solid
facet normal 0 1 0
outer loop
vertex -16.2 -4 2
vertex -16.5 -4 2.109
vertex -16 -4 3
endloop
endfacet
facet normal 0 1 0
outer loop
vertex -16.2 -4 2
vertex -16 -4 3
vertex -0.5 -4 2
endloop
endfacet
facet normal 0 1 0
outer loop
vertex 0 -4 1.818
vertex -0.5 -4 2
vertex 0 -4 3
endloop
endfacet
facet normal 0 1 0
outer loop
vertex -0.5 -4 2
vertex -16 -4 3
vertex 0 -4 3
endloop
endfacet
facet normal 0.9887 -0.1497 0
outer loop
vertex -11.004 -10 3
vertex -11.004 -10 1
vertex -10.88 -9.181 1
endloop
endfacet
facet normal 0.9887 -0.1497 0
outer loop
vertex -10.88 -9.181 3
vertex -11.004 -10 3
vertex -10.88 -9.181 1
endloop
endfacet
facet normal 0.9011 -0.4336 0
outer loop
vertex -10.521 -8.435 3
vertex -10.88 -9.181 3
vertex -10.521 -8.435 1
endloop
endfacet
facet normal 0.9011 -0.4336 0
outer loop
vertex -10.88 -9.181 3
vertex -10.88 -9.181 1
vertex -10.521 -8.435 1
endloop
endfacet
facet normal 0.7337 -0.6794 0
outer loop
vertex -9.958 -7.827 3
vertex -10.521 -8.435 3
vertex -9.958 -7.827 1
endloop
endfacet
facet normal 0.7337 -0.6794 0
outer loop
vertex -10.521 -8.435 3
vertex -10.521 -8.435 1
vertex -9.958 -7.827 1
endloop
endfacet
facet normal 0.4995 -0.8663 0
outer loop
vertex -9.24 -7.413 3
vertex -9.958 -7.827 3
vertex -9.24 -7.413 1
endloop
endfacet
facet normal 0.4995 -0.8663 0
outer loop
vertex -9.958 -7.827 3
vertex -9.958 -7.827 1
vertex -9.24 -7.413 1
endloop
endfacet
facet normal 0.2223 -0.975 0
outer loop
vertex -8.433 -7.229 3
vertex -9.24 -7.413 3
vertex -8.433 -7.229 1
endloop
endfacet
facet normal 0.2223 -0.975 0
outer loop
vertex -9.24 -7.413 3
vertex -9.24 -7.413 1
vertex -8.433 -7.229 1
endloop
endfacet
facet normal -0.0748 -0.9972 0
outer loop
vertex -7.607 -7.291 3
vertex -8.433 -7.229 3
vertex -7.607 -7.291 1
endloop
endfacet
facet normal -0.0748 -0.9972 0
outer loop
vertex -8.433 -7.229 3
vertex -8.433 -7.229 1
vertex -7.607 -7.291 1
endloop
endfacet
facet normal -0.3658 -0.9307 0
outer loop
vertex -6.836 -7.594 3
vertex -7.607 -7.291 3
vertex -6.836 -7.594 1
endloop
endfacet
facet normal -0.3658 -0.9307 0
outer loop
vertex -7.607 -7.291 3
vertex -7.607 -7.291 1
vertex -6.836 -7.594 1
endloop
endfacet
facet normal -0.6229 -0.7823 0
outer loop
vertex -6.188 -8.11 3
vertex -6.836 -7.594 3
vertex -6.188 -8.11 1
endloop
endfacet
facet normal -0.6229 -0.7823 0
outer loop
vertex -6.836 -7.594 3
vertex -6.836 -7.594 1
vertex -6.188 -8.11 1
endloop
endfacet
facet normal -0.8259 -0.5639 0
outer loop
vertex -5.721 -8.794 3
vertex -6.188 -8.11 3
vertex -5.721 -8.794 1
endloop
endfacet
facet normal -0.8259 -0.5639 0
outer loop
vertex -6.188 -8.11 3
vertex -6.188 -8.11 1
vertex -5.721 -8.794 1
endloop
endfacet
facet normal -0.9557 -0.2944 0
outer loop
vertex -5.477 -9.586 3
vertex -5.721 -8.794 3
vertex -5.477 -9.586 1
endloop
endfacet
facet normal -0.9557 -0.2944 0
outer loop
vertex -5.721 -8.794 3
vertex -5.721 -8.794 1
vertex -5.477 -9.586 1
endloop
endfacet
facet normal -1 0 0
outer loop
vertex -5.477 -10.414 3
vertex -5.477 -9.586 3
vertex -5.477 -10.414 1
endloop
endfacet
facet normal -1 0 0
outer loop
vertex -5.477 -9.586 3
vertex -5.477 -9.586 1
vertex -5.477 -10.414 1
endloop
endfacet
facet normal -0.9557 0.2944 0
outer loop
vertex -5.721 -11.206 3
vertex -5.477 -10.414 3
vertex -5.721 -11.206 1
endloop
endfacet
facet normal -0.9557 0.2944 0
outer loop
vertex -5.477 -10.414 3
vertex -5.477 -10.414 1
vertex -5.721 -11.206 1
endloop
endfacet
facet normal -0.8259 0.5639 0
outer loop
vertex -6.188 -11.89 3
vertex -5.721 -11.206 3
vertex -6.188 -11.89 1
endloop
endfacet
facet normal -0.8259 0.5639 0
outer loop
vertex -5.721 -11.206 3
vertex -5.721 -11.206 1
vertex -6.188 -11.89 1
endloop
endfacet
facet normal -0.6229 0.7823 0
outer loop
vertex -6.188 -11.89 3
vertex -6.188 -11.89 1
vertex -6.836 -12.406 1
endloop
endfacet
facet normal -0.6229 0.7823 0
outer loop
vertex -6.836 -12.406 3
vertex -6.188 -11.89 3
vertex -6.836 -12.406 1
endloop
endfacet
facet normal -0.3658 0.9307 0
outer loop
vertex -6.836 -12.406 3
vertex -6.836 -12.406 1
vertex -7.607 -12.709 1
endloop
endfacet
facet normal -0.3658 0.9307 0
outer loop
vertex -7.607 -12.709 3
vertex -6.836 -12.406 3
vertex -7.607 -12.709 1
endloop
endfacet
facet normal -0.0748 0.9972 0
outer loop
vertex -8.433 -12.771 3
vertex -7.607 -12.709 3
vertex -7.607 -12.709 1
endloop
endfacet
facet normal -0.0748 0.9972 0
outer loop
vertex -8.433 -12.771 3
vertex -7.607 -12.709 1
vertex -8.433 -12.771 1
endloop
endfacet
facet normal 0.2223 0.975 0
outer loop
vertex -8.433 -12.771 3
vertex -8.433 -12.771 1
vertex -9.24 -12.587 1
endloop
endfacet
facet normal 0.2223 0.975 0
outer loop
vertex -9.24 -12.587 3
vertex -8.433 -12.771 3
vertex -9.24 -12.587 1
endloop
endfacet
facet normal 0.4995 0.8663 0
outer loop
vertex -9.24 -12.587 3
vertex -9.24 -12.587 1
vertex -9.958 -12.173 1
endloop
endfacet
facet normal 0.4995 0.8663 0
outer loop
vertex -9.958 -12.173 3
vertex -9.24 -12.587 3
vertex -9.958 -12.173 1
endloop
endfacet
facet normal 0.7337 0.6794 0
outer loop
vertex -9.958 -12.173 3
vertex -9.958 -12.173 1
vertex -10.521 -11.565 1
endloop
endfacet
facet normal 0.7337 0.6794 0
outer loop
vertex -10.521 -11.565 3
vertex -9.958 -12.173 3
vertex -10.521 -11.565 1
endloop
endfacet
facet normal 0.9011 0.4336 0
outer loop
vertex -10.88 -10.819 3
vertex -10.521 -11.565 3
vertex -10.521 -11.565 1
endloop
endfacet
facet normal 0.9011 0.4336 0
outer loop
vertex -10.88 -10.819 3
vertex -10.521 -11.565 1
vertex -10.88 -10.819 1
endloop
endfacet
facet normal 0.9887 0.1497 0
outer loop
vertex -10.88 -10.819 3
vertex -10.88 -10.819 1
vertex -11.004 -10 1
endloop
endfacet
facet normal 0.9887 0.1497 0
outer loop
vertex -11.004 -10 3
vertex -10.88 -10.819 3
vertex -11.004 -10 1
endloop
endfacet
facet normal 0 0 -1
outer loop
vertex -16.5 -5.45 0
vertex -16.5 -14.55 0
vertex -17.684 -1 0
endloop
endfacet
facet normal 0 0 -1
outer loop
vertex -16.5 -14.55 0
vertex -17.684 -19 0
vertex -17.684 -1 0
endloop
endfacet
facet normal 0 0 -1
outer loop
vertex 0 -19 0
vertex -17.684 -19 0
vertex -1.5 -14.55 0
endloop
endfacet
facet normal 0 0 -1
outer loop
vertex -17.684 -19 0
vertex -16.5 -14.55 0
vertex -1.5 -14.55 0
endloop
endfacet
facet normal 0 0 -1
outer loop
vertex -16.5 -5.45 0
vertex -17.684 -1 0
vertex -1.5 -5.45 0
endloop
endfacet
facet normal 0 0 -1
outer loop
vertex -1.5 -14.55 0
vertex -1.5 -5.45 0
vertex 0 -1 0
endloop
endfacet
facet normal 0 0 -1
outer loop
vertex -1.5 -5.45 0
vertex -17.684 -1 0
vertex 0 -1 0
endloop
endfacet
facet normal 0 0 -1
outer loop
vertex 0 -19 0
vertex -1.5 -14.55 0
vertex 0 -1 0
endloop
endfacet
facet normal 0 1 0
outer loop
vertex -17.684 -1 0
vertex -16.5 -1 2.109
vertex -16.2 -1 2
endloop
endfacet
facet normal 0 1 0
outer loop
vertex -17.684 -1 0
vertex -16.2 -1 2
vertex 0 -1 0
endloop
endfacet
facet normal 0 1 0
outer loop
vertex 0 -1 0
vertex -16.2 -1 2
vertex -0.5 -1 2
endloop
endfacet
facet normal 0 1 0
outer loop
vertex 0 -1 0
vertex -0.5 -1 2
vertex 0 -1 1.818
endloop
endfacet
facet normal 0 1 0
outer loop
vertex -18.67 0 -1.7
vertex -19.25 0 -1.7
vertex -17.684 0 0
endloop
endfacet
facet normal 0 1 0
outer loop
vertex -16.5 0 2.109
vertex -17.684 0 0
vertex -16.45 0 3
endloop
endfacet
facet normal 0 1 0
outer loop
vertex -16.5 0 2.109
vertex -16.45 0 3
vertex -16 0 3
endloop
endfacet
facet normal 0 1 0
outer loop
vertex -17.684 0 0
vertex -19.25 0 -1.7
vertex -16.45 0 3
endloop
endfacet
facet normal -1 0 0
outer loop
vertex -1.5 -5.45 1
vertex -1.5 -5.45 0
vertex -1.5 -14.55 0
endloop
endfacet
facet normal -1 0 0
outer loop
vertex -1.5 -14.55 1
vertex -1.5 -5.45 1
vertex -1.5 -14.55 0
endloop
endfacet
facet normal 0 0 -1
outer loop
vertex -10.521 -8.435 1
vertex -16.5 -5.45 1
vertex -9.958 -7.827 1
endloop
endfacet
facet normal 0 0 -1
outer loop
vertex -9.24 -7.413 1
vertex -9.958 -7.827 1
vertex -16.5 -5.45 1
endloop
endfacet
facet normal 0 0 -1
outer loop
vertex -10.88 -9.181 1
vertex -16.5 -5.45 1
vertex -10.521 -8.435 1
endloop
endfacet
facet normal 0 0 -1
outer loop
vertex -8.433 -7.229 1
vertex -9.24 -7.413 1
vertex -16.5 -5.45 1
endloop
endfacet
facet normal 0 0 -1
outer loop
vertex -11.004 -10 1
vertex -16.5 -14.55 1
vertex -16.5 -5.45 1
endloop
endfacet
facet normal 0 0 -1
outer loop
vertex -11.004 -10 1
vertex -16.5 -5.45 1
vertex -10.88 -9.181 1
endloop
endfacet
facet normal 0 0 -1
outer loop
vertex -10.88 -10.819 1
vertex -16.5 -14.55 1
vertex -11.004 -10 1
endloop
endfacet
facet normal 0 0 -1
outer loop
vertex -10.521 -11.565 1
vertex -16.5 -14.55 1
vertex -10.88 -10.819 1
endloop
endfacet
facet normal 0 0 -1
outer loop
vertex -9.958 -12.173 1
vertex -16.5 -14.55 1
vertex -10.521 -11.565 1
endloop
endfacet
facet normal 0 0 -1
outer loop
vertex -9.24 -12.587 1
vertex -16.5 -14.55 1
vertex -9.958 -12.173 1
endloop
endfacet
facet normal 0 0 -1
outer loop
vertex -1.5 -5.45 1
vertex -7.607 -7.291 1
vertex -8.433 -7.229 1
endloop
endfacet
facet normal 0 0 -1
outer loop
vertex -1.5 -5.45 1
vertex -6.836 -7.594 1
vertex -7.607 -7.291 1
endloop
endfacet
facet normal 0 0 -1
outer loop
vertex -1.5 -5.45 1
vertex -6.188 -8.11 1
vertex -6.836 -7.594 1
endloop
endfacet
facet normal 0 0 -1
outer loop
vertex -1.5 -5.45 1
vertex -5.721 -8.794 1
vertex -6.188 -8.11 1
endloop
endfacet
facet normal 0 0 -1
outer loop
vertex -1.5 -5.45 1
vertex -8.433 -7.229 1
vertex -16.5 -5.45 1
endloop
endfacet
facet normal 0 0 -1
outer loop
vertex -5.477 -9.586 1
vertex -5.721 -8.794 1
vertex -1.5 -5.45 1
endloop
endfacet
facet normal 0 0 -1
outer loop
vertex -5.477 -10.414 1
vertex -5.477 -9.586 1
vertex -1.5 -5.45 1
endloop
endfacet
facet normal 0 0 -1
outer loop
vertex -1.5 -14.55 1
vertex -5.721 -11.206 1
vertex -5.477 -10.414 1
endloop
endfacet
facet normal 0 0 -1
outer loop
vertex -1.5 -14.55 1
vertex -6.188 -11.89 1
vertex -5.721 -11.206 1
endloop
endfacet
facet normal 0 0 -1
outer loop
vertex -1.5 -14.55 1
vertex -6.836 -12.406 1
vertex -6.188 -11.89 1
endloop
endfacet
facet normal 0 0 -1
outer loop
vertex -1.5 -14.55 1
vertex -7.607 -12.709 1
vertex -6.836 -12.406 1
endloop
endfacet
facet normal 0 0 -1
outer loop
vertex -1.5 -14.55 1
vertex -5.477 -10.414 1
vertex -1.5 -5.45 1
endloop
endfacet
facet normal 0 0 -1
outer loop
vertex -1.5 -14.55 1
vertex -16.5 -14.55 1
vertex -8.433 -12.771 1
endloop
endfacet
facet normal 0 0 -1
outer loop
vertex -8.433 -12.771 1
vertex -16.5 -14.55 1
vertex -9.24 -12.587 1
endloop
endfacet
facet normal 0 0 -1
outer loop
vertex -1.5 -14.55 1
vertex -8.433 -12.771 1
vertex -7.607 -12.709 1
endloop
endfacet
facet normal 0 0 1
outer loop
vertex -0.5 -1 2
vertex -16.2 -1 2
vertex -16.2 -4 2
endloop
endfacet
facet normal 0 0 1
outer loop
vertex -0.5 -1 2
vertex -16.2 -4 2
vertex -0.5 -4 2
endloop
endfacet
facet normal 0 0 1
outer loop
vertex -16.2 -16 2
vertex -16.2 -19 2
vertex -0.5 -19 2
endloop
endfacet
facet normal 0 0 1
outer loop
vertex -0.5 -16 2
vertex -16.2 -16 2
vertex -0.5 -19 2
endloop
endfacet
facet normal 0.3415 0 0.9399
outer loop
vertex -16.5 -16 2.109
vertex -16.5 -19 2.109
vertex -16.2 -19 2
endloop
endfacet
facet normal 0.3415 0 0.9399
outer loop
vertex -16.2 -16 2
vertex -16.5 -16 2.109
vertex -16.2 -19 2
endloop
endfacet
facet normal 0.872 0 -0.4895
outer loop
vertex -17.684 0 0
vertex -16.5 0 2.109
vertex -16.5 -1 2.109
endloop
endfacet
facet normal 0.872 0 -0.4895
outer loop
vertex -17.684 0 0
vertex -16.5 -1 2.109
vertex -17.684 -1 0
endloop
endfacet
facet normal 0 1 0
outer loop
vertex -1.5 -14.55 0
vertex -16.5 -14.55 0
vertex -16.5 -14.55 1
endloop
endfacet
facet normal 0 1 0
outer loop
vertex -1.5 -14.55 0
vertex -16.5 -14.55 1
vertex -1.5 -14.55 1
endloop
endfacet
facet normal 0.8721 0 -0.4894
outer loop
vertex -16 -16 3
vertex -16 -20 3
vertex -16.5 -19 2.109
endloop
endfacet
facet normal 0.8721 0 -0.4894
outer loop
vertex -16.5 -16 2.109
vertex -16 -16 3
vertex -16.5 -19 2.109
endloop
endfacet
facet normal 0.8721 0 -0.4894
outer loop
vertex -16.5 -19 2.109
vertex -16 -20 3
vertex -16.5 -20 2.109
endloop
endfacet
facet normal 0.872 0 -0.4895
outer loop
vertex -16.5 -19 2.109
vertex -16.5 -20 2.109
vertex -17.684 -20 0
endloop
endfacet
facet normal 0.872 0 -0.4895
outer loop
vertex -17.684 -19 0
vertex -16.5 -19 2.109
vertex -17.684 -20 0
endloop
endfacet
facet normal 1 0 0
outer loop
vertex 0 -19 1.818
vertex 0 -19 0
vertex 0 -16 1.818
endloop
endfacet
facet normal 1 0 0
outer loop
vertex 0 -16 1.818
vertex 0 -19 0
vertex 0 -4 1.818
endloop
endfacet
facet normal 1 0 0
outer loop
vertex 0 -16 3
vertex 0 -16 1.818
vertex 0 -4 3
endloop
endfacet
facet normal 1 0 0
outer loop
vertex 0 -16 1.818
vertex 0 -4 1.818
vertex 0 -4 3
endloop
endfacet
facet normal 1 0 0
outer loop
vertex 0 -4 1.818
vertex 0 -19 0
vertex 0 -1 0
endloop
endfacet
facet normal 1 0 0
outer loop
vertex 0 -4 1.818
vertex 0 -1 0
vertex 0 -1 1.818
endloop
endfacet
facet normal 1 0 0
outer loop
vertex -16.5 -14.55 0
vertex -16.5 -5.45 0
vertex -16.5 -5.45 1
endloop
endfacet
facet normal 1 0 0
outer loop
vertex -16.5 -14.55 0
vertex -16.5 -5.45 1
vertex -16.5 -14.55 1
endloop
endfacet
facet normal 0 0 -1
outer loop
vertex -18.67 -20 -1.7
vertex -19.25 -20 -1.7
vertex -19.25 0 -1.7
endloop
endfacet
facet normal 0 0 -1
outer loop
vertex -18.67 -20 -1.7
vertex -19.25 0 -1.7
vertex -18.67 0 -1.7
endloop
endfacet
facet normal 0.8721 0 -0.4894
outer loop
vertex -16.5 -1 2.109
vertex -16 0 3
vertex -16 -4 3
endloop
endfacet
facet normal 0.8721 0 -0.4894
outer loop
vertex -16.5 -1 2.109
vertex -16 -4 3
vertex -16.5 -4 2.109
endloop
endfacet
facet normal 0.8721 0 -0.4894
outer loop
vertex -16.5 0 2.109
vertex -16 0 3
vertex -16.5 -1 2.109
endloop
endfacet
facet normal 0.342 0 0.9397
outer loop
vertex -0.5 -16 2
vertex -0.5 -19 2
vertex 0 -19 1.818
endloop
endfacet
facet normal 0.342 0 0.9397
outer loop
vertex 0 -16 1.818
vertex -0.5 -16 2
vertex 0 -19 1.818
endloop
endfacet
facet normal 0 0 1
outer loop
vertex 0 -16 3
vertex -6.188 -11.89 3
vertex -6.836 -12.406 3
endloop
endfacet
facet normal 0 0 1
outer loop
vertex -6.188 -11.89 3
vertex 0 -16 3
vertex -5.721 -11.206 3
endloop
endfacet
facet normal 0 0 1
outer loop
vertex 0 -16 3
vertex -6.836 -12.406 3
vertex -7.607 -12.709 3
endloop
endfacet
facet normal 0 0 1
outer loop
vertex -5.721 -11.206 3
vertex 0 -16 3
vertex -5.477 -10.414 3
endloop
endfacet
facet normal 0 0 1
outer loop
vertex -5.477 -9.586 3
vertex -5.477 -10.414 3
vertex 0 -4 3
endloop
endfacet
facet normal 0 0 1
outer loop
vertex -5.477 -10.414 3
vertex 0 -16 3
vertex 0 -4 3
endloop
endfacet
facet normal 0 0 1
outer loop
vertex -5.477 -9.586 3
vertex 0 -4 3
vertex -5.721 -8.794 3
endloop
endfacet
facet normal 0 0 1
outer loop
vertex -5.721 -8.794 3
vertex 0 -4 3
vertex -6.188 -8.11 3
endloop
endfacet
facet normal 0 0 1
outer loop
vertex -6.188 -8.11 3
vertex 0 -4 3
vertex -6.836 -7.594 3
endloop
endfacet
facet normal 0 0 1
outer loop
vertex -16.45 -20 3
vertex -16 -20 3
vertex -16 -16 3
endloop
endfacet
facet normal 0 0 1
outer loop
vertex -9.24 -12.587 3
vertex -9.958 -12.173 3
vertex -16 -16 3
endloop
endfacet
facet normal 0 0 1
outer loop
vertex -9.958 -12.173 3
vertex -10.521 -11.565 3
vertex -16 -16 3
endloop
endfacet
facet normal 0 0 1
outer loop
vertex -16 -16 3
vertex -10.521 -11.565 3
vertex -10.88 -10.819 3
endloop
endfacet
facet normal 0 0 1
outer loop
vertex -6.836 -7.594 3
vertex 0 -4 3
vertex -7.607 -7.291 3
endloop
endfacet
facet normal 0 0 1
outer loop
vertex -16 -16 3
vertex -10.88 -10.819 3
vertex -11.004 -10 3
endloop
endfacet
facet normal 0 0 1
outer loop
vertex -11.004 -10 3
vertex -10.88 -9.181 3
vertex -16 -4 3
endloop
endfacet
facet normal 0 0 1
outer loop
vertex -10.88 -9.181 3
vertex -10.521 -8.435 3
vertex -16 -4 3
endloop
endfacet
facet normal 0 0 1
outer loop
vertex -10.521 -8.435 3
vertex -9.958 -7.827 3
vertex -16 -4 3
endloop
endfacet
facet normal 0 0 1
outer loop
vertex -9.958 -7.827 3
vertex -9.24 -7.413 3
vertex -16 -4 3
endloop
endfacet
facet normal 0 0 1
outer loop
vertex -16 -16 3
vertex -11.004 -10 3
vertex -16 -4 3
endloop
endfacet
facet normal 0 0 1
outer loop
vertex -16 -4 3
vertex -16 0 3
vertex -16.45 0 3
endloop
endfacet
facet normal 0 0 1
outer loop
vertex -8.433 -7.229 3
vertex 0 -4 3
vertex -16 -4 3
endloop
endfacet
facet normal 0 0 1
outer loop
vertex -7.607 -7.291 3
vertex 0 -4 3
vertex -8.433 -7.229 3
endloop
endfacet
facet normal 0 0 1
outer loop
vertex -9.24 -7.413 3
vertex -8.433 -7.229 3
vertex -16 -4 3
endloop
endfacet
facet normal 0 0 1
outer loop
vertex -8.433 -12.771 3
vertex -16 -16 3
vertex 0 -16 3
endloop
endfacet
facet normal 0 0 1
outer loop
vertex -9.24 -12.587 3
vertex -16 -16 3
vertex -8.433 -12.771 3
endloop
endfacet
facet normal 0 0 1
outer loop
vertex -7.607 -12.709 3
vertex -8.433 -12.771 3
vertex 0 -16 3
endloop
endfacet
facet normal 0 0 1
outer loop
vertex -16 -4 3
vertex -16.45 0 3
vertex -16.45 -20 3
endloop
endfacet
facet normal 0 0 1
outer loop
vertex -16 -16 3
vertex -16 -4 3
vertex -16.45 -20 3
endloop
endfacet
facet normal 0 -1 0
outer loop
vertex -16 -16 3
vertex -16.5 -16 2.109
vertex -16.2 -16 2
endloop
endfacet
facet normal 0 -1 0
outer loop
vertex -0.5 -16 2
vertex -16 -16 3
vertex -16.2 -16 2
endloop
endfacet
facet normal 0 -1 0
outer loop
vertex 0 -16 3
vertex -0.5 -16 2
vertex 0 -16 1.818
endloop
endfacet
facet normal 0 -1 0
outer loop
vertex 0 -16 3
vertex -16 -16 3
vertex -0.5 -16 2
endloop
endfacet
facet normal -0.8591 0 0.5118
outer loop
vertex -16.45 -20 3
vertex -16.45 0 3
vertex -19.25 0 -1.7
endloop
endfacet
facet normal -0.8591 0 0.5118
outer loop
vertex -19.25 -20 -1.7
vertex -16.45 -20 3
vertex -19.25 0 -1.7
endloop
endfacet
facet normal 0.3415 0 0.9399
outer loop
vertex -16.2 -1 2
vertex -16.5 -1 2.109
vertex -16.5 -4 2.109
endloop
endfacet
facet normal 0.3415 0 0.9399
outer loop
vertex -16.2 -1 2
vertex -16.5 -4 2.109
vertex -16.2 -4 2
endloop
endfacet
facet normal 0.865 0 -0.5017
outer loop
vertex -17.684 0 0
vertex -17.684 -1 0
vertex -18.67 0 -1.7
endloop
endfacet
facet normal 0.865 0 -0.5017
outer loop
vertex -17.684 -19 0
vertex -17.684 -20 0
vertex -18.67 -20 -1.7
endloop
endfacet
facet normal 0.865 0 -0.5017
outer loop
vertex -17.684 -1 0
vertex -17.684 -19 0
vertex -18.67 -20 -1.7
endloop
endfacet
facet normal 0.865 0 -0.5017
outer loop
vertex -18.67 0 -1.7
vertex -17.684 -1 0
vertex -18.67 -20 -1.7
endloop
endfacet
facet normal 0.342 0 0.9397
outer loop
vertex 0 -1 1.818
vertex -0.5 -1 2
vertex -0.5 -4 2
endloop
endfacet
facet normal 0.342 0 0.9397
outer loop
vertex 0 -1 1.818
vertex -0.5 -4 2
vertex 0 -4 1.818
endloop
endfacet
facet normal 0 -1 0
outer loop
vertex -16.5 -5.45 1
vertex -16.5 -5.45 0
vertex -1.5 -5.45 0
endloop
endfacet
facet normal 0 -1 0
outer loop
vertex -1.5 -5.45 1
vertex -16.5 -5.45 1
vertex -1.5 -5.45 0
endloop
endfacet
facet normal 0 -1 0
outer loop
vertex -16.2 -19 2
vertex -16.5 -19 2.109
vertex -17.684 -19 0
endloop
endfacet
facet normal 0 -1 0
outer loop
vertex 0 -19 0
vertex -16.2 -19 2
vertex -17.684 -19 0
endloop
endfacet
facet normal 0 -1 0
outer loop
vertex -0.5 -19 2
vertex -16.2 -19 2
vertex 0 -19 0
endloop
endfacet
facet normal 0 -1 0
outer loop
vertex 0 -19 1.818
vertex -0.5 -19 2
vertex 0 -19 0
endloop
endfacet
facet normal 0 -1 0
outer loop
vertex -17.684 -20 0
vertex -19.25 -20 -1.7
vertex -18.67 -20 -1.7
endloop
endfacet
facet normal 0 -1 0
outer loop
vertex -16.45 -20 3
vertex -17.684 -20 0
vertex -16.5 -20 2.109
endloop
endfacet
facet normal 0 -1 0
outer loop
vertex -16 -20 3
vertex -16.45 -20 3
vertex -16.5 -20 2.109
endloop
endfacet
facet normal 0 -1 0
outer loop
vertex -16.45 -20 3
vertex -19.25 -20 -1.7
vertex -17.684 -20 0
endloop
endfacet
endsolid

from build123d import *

# Parameters (mm, degrees)
F1_DEPTH  = 20
F3_DEPTH  = 4
F5_DEPTH  = 1
F7_DEPTH  = 20.001
F10_W     = 15
F10_H     = 9.1
F11_DEPTH = 1
F12_D     = 5.55752


# Not quite as in the source:
# - a pattern or mirror of a feature is missing from the dataset's text; its kind, count and spacing are read off the source's solid


with BuildPart() as f1:
    # F0 (on Front) → F1 (new body)
    with BuildSketch(Plane.XZ):
        Polygon((-16.45, 3), (-19.25, -1.7), (-18.09, -1.7), (-17.0772340426, 0), (0, 0), (0, 3), align=None)
    extrude(amount=F1_DEPTH)

    # F2 (on face) → F3 (cut)
    with BuildSketch(Plane.XZ.offset(20)):
        Polygon((-16.2, 2), (-0.5, 2), (0, 1.8180148829), (0, 3), (-16, 3), (-16.5, 2.1091910703), align=None)
    f3 = extrude(amount=-F3_DEPTH, mode=Mode.SUBTRACT)

    # F3_copies: F3 across plane
    add(f3.mirror(Plane.ZX.offset(-10)), mode=Mode.SUBTRACT)

    # F4 (on face) → F5 (cut)
    with BuildSketch(Plane.XZ.offset(20)):
        Polygon((0, 0), (0, 1.8180148829), (-0.5, 2), (-16.2, 2), (-16.5, 2.1091910703), (-17.683862779, 0), align=None)
    f5 = extrude(amount=-F5_DEPTH, mode=Mode.SUBTRACT)

    # F5_copies: F5 across plane
    add(f5.mirror(Plane.ZX.offset(-10)), mode=Mode.SUBTRACT)

    # F6 (on face) → F7 (cut, through all)
    with BuildSketch(Plane.XZ.offset(20)):
        Polygon((-18.67, -1.7), (-18.09, -1.7), (-17.0772340426, 0), (-17.683862779, 0), align=None)
    extrude(amount=-F7_DEPTH, mode=Mode.SUBTRACT)

    # F10 (on face) → F11 (cut)
    with BuildSketch(Plane(origin=(0, 0, 0), x_dir=(1, 0, 0), z_dir=(0, 0, -1))):
        with Locations((-9, 10)):
            Rectangle(F10_W, F10_H)
    extrude(amount=-F11_DEPTH, mode=Mode.SUBTRACT)

    # F12 (through all)
    with Locations(Plane.XY.offset(3)):
        with Locations((-8.225, -10)):
            Hole(F12_D / 2)


solid = f1.part
